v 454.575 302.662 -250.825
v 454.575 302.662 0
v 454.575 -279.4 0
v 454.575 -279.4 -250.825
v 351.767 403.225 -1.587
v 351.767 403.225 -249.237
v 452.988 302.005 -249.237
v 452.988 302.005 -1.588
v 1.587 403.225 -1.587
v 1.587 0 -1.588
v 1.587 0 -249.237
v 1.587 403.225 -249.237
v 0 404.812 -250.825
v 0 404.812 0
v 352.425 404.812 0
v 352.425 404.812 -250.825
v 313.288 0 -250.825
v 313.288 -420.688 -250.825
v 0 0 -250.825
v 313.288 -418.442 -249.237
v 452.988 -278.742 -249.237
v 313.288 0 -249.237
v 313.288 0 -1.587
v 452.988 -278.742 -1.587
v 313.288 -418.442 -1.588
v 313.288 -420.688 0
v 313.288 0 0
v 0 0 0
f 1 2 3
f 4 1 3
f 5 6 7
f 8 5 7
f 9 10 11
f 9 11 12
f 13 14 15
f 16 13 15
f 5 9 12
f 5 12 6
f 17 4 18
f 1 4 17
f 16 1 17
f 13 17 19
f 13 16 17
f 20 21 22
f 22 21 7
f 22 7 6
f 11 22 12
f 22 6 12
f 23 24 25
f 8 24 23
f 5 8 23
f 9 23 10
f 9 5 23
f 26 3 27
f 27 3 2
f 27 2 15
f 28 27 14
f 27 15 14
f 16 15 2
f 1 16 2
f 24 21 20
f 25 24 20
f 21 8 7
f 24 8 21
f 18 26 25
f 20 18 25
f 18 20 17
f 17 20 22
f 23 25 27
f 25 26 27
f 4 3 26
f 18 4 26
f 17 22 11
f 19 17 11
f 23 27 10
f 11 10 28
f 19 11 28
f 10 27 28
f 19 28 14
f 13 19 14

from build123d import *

# Parameters (mm, degrees)
BOSS_EXTRUDE1_DEPTH = 250.825
SHELL1_T            = -1.5875


with BuildPart() as part:
    # Sketch1 → Boss-Extrude1 (new body)
    with BuildSketch(Plane.XY):
        Polygon((0, 0), (0, 404.8125), (352.425, 404.8125), (454.575413377, 302.662086623), (454.575413377, -279.4), (313.287913377, -420.6875), (313.287913377, 0), align=None)
    extrude(amount=-BOSS_EXTRUDE1_DEPTH)

    # Shell1
    shell1_openings = [part.faces().sort_by_distance(p)[0] for p in [
        (313.287913377, -210.34375, -125.4125),
        (156.643956689, 0, -125.4125),
    ]]
    offset(amount=SHELL1_T, openings=shell1_openings, kind=Kind.INTERSECTION)


solid = part.part
